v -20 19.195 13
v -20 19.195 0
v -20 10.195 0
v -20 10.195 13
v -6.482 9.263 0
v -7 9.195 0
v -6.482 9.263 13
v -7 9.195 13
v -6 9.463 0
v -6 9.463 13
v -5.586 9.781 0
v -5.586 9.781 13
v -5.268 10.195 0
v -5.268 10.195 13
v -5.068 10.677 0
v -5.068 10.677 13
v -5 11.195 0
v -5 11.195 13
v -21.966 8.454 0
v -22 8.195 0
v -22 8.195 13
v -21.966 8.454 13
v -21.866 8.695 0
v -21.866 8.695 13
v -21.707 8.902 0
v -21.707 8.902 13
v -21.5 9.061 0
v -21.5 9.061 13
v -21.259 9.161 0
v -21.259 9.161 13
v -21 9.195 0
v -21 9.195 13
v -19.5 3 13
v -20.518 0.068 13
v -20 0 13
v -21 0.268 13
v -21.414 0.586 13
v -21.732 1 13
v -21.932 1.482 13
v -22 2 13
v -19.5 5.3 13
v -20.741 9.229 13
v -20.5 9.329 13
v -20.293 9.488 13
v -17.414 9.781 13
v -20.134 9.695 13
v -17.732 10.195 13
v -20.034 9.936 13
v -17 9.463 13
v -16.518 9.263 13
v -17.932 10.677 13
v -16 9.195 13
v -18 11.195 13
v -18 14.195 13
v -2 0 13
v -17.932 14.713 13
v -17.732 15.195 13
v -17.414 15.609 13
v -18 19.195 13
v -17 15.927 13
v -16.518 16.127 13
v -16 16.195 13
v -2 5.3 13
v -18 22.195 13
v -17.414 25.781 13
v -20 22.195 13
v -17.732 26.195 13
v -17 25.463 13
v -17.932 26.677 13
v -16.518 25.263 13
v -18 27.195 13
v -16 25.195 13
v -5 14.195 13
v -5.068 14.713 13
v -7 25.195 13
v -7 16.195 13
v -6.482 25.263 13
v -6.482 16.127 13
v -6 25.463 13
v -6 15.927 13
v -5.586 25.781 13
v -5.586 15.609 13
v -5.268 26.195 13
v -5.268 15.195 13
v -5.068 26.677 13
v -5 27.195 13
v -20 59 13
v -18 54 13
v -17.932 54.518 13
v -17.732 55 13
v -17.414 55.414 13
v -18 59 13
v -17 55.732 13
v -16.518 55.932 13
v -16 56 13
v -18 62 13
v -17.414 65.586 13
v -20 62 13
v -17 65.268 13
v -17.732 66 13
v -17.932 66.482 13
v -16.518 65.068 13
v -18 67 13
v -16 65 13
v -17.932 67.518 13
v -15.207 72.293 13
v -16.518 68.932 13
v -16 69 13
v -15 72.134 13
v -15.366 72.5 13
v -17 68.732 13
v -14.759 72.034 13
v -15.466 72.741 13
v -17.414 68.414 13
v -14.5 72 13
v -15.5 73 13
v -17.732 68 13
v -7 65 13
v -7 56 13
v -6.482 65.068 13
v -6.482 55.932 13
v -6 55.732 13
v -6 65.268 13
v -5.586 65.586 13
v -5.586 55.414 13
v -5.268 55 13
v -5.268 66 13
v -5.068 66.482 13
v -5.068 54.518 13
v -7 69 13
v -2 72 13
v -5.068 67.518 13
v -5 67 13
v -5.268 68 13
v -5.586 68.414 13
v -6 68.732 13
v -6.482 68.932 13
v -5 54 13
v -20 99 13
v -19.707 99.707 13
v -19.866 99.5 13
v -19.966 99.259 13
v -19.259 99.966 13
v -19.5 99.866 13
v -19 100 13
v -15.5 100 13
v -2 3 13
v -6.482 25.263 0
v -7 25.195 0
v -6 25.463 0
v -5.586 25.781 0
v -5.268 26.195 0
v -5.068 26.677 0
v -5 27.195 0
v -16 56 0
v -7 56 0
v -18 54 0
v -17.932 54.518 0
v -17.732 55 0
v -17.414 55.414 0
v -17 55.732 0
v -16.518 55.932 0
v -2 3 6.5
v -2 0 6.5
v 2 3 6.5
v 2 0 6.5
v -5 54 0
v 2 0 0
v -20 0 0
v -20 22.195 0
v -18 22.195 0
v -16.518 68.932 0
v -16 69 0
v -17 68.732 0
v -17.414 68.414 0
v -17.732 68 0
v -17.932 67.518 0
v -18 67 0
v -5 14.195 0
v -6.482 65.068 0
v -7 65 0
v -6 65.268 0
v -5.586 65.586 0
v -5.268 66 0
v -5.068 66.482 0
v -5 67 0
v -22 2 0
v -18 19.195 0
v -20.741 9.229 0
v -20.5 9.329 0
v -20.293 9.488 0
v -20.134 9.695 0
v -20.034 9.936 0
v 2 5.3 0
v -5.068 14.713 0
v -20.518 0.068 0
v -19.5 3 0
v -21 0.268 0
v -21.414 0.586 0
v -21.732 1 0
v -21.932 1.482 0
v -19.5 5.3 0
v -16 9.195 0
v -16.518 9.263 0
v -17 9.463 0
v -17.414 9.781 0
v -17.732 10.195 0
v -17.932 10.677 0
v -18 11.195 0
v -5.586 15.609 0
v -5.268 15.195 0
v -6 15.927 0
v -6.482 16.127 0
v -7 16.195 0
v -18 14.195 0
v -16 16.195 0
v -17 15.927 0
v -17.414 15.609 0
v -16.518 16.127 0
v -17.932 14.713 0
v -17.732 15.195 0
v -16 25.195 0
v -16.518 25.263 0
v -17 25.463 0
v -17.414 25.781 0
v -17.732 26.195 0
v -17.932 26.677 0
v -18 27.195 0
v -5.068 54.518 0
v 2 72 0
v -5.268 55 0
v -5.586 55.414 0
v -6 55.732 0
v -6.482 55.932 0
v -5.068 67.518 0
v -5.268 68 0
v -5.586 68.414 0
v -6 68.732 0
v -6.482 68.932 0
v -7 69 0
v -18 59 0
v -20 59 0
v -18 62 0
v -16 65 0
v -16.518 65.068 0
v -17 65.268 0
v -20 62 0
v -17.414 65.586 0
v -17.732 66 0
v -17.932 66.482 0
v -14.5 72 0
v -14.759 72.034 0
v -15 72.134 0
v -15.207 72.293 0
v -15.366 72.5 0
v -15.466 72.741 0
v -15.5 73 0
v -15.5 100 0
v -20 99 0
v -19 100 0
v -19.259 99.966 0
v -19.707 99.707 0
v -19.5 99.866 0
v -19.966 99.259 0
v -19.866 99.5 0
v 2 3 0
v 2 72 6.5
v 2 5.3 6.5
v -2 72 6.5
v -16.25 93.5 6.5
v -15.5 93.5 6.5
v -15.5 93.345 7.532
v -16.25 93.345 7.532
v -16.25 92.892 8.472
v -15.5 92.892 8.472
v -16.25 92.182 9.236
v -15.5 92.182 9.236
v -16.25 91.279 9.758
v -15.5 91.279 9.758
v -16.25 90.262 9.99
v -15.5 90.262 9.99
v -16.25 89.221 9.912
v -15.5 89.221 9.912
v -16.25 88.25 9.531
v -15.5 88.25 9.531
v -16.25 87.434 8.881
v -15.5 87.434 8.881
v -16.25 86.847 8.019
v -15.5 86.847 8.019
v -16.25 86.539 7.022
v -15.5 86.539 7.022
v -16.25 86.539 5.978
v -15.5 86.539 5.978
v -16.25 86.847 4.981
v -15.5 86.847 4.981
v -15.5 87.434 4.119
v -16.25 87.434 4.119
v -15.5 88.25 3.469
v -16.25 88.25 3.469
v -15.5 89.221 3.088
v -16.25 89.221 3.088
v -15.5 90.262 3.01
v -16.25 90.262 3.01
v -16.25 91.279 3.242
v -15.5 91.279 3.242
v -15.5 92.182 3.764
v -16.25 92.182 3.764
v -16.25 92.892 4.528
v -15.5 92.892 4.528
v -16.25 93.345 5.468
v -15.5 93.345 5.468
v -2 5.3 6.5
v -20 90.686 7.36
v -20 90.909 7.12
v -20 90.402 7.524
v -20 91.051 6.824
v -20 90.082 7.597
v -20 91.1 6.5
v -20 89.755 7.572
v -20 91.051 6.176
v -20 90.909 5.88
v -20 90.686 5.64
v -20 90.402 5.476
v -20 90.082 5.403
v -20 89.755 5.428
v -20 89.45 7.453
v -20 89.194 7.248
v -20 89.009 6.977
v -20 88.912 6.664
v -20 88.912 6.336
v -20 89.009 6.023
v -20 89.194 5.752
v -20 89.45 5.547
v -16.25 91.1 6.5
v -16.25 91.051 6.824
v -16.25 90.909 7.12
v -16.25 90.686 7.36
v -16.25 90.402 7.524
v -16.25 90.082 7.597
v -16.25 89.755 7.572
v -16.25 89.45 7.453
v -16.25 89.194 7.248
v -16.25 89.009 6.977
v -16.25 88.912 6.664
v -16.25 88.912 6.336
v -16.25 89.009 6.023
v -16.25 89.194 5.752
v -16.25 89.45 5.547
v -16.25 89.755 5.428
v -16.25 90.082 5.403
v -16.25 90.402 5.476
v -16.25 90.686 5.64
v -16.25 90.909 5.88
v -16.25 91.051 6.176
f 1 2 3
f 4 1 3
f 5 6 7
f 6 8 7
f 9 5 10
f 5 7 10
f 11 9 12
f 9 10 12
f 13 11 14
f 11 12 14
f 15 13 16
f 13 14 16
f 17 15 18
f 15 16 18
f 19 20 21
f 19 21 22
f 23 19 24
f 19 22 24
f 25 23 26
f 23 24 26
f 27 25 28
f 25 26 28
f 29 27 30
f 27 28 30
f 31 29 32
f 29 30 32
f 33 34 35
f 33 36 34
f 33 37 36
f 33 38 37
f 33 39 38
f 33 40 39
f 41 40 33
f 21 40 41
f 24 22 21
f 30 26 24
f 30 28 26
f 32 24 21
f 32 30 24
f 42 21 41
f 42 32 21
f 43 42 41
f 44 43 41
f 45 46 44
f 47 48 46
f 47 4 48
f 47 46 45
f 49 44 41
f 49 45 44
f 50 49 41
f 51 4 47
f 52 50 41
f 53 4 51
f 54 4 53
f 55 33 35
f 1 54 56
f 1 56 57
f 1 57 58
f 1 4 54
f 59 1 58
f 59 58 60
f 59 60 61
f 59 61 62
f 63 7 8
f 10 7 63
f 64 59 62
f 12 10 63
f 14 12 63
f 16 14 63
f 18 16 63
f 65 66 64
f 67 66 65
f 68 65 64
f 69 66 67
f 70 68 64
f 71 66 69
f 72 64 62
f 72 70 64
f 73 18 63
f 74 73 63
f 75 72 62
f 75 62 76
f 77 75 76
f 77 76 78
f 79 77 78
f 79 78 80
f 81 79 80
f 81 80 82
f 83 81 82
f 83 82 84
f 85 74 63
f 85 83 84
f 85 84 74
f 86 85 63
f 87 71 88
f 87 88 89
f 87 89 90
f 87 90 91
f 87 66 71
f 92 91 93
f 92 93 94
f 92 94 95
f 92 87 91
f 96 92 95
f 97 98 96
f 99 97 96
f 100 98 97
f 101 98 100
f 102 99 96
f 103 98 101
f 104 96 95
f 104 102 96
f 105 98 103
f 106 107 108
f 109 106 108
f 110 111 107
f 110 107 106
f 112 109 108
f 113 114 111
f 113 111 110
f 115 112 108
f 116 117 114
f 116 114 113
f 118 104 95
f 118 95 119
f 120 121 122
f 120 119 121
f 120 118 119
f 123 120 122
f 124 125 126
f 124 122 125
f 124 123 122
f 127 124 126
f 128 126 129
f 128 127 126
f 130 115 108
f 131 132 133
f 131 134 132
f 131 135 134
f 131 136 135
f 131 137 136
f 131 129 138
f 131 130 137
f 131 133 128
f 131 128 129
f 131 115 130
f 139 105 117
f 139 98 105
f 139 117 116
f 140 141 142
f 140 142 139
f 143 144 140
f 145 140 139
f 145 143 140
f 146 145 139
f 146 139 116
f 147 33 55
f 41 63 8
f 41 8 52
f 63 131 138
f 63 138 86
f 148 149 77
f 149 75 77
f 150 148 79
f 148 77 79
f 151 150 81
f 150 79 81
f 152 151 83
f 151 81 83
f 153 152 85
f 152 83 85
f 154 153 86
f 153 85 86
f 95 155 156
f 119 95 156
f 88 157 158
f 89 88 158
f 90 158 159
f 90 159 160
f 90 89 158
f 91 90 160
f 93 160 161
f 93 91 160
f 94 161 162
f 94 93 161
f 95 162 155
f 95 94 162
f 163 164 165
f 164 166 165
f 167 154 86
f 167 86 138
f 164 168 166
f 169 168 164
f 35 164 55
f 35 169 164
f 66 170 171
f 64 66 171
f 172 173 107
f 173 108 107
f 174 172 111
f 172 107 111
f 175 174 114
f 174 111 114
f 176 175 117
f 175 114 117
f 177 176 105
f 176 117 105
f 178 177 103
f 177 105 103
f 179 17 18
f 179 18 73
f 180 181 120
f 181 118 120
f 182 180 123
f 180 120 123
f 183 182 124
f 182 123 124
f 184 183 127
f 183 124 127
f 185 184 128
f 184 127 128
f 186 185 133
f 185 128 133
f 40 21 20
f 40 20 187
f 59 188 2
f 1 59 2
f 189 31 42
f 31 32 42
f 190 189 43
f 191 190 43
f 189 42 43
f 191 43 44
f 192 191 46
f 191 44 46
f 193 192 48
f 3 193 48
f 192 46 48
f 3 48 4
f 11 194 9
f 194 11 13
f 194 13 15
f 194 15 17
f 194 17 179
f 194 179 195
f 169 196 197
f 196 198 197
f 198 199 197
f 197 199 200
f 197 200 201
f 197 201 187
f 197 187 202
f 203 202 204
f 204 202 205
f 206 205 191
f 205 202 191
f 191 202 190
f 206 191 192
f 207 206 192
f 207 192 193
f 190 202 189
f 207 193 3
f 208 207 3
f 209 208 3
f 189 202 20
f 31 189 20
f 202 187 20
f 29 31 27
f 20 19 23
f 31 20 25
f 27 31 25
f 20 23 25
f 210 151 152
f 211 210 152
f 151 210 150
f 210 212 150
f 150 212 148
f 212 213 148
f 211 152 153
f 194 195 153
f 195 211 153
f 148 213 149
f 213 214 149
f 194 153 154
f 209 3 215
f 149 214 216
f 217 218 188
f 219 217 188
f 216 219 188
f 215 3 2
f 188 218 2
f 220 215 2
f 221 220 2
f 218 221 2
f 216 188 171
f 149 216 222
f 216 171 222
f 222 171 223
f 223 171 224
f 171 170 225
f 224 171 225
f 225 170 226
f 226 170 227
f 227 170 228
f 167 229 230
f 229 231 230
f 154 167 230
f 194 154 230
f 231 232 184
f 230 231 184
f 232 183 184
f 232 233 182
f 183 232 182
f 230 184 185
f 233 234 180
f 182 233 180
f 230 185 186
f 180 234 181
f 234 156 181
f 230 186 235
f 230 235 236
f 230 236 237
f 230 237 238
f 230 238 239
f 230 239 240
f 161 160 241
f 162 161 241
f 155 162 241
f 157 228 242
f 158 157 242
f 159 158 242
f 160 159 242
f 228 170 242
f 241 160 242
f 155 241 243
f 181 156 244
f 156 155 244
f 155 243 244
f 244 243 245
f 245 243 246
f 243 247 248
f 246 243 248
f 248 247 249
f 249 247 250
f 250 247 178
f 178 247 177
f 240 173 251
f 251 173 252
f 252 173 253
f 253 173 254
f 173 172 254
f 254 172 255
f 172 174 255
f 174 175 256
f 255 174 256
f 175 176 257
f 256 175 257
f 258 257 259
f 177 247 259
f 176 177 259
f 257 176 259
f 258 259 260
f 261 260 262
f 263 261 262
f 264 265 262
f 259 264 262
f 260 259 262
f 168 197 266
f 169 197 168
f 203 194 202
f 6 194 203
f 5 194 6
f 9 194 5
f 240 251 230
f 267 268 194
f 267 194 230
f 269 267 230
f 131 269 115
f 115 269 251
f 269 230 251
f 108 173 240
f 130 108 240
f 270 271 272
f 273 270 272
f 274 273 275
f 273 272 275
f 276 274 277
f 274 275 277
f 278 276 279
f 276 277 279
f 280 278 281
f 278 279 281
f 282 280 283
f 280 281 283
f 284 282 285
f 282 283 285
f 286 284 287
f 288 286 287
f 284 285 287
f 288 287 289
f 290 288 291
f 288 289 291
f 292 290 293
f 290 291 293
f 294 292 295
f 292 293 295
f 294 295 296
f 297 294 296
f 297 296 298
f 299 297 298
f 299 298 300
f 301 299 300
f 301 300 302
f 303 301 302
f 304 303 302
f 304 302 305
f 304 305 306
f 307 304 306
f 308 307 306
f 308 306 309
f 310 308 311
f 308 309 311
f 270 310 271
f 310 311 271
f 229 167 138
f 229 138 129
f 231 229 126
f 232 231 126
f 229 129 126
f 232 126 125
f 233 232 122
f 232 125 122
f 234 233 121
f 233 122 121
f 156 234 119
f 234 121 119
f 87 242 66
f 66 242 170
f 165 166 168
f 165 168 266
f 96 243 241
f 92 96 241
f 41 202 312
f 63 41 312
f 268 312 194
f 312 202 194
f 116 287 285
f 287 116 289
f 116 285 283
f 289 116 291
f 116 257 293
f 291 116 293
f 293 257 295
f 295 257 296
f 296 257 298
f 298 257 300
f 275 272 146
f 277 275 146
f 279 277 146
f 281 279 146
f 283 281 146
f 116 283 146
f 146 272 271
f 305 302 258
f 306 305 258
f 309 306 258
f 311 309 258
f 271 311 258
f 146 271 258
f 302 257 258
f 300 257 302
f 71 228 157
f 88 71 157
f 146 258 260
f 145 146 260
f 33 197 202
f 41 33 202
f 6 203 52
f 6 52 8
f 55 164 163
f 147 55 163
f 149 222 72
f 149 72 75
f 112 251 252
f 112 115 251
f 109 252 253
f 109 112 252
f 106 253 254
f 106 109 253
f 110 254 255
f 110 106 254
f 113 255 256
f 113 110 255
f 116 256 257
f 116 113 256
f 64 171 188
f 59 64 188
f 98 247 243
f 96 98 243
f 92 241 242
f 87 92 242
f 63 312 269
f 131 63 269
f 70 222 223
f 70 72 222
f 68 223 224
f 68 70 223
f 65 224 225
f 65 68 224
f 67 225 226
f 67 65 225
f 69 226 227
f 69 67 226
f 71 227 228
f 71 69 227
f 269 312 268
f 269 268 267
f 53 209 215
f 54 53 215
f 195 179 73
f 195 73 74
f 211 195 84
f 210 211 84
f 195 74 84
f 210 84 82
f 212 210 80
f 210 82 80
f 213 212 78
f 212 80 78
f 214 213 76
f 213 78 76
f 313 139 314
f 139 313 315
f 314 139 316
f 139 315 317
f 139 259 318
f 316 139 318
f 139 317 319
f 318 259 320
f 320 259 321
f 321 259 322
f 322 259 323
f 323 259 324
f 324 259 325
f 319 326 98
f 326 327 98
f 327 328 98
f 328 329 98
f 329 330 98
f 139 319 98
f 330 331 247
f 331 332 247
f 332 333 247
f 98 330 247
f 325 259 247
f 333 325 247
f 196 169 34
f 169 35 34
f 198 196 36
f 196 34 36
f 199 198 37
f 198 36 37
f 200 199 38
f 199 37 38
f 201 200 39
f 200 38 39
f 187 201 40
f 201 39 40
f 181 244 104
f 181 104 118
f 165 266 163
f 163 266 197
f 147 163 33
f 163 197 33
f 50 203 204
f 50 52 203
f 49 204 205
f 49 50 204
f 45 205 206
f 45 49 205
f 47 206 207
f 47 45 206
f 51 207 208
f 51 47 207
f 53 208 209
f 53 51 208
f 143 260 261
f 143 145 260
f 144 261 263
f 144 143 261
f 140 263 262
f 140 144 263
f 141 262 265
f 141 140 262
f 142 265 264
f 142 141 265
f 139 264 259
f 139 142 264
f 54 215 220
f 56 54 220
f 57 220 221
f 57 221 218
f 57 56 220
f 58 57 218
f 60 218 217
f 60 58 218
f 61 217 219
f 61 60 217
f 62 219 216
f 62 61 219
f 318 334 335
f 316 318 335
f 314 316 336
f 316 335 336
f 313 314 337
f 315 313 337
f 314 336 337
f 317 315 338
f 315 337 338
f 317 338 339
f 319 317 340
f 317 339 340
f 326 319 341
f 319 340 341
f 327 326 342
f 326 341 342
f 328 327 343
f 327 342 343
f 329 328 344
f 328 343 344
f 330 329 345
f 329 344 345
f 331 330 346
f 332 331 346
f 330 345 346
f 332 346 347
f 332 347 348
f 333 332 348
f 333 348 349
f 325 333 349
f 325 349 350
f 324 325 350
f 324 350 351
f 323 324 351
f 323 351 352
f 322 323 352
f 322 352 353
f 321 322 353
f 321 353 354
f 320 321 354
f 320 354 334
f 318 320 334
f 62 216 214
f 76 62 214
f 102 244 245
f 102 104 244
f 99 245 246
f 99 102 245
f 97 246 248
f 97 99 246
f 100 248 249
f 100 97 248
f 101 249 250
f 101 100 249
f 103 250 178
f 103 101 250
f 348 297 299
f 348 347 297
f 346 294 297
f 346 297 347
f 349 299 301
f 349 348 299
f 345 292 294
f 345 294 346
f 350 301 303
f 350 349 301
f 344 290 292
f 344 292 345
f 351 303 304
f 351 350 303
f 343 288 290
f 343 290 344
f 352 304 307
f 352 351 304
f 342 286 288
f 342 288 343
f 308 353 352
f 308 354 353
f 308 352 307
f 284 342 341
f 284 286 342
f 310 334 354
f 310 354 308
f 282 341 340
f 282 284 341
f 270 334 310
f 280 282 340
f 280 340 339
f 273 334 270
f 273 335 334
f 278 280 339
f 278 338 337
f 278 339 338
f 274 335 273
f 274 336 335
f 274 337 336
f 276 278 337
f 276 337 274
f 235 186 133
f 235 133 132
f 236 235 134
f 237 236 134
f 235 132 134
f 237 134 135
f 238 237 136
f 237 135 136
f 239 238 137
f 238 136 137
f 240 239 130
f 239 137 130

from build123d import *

# Parameters (mm, degrees)
F0_W      = 13
F0_H      = 7
F0_H_2    = 30.8050829545
F0_H_3    = 4
F1_DEPTH  = 13
F3_R      = 1.99999
F4_R      = 0.99999
F5_D      = 2.2
F7_W      = 3
F7_H      = 6.5
F6_W      = 66.7
F6_H      = 6.5
F8_DEPTH  = 2
F9_DEPTH  = 2
F10_R     = 3.5
F10_R_2   = 1.1
F11_DEPTH = 0.75


# Not quite as in the source:
# - a fillet or chamfer is up to 0.001 mm smaller than in the source, because OpenCascade refuses the exact size


with BuildPart() as f1:
    # F0 (on Top) → F1 (new body)
    with BuildSketch(Plane.XY):
        Polygon((-22, 0), (0, 0), (0, 3), (-19.5, 3), (-19.5, 5.3), (0, 5.3), (0, 72), (-15.5, 72), (-15.5, 100), (-20, 100), (-20, 62), (-18, 62), (-18, 59), (-20, 59), (-20, 22.1949170455), (-18, 22.1949170455), (-18, 19.1949170455), (-20, 19.1949170455), (-20, 9.1949170455), (-22, 9.1949170455), align=None)
        with Locations((-11.5, 12.6949170455)):
            Rectangle(F0_W, F0_H, mode=Mode.SUBTRACT)
        with Locations((-11.5, 40.5974585228)):
            Rectangle(F0_W, F0_H_2, mode=Mode.SUBTRACT)
        with Locations((-11.5, 67)):
            Rectangle(F0_W, F0_H_3, mode=Mode.SUBTRACT)
    extrude(amount=F1_DEPTH)

    # F3 (radius 2 in the source; OpenCascade refuses exactly that, so slightly less here)
    f3_edges = [f1.edges().sort_by_distance(p)[0] for p in [
        (-22, 0, 6.5),
        (-18, 69, 6.5),
        (-18, 65, 6.5),
        (-5, 69, 6.5),
        (-5, 65, 6.5),
        (-18, 56, 6.5),
        (-5, 56, 6.5),
        (-18, 25.194917, 6.5),
        (-5, 25.194917, 6.5),
        (-18, 9.194917, 6.5),
        (-5, 9.194917, 6.5),
        (-5, 16.194917, 6.5),
        (-18, 16.194917, 6.5),
    ]]
    fillet(f3_edges, radius=F3_R)

    # F4 (radius 1 in the source; OpenCascade refuses exactly that, so slightly less here)
    f4_edges = [f1.edges().sort_by_distance(p)[0] for p in [
        (-15.5, 72, 6.5),
        (-20, 100, 6.5),
        (-22, 9.194917, 6.5),
        (-20, 9.194917, 6.5),
    ]]
    fillet(f4_edges, radius=F4_R)

    # F5 (through all)
    with Locations(Plane(origin=(-20, 0, 0), x_dir=(0, -1, 0), z_dir=(-1, 0, 0))):
        with Locations((-90, 6.5)):
            Hole(F5_D / 2)

    # F7 (on face) + F6 (on face) → F8 (join)
    with BuildSketch(Plane.YZ):
        with Locations((1.5, 3.25)):
            Rectangle(F7_W, F7_H)
    with BuildSketch(Plane.YZ):
        with Locations((38.65, 3.25)):
            Rectangle(F6_W, F6_H)
    extrude(amount=F8_DEPTH)

    # F9 (cut): faces of the model
    f9_faces = [f1.faces().sort_by_distance(p)[0] for p in [
        (0, 1.5, 9.75),
        (0, 38.65, 9.75),
    ]]
    extrude(f9_faces, amount=-F9_DEPTH, mode=Mode.SUBTRACT)

    # F10 (on face) → F11 (cut)
    with BuildSketch(Plane.YZ.offset(-15.5)):
        with Locations((90, 6.5)):
            Circle(F10_R)
        with Locations((90, 6.5)):
            Circle(F10_R_2, mode=Mode.SUBTRACT)
    extrude(amount=-F11_DEPTH, mode=Mode.SUBTRACT)


solid = f1.part
